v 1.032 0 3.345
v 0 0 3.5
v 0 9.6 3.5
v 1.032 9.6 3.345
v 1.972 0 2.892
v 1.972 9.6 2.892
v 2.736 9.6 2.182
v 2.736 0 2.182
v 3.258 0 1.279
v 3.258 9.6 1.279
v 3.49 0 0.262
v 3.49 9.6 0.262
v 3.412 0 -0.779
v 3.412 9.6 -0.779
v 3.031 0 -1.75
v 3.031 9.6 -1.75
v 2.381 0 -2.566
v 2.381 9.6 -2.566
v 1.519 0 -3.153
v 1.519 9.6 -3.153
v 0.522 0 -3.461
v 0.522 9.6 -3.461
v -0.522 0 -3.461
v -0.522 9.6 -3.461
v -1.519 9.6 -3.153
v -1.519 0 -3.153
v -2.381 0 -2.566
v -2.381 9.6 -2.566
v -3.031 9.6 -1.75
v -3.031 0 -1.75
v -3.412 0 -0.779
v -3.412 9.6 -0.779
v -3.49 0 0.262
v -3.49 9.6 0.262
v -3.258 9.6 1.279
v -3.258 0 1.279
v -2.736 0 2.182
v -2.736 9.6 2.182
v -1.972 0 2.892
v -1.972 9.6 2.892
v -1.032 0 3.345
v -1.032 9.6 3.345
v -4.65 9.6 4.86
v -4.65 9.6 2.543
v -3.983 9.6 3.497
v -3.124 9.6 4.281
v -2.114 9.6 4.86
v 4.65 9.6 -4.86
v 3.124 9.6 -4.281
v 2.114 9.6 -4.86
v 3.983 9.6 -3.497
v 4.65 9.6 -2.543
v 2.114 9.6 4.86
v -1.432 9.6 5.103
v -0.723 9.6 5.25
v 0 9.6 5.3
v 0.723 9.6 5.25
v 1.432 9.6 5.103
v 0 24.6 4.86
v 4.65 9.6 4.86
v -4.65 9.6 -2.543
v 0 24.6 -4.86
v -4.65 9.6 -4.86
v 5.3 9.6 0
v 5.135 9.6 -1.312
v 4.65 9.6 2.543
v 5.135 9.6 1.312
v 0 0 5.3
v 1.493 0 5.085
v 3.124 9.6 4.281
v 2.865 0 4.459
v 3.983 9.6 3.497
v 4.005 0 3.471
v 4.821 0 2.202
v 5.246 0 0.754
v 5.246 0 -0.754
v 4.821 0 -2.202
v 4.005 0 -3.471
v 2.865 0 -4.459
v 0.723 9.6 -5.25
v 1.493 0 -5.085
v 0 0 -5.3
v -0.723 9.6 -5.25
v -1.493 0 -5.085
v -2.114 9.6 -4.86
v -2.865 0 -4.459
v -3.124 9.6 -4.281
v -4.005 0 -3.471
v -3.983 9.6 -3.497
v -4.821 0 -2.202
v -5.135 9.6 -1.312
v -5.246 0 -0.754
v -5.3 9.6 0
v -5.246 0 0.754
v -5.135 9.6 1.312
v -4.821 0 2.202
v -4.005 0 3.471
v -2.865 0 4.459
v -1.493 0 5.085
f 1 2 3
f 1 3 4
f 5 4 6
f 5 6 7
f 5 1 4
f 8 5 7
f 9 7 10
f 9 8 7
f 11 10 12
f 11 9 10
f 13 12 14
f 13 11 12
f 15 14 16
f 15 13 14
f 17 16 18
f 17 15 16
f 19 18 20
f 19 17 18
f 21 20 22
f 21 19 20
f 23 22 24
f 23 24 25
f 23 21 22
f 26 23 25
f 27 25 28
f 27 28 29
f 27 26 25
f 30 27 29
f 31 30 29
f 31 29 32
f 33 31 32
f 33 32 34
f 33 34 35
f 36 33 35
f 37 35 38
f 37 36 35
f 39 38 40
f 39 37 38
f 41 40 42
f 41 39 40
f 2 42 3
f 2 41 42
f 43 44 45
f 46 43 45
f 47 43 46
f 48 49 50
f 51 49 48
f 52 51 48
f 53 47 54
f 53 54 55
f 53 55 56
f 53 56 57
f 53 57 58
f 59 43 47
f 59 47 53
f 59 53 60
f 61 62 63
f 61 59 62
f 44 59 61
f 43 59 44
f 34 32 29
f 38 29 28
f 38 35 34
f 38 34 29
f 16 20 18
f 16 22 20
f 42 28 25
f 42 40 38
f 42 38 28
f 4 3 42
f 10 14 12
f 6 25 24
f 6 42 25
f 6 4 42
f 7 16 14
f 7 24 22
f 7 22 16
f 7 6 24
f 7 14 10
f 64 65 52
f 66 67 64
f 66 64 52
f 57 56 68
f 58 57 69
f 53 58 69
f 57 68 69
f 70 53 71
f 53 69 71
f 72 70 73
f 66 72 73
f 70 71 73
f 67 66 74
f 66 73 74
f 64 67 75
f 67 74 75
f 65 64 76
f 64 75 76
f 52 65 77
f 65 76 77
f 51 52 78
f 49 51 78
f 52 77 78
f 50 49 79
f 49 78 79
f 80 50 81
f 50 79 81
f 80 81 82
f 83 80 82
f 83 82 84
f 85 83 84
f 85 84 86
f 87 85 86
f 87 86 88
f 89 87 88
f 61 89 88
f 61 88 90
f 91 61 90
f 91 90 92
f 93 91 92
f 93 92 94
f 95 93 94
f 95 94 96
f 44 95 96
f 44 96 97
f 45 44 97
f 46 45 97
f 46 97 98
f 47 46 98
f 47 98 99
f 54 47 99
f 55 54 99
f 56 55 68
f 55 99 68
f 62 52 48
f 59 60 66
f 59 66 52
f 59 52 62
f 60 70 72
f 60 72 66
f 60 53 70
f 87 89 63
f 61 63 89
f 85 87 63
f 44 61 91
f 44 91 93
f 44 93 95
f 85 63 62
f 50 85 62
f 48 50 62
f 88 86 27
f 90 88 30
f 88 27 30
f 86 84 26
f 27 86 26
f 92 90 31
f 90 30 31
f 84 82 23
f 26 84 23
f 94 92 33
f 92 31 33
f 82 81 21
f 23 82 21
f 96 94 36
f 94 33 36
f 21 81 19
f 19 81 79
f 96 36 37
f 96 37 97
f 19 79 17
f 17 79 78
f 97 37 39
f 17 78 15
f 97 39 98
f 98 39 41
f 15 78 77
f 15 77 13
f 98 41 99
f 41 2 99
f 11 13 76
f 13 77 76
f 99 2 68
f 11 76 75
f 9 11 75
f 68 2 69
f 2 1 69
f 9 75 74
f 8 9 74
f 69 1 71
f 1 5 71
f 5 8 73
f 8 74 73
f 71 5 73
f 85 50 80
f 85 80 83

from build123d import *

# Parameters (mm, degrees)
SKETCH1_R           = 5.3
SKETCH1_R_2         = 3.5
BOSS_EXTRUDE1_DEPTH = 9.6
BOSS_EXTRUDE2_DEPTH = 4.86


with BuildPart() as part:
    # Sketch1 → Boss-Extrude1 (new body)
    with BuildSketch(Plane(origin=(0, 0, 0), x_dir=(1, 0, 0), z_dir=(0, 1, 0))):
        with Locations(Location((0, 0, 0), (0, 0, 270))):
            Circle(SKETCH1_R)
        with Locations(Location((0, 0, 0), (0, 0, 270))):
            Circle(SKETCH1_R_2, mode=Mode.SUBTRACT)
    extrude(amount=BOSS_EXTRUDE1_DEPTH)

    # Sketch2 → Boss-Extrude2 (add, symmetric)
    with BuildSketch(Plane.XY):
        Polygon((-4.65, 9.6), (4.65, 9.6), (0, 24.6), align=None)
    extrude(amount=BOSS_EXTRUDE2_DEPTH, both=True)


solid = part.part
